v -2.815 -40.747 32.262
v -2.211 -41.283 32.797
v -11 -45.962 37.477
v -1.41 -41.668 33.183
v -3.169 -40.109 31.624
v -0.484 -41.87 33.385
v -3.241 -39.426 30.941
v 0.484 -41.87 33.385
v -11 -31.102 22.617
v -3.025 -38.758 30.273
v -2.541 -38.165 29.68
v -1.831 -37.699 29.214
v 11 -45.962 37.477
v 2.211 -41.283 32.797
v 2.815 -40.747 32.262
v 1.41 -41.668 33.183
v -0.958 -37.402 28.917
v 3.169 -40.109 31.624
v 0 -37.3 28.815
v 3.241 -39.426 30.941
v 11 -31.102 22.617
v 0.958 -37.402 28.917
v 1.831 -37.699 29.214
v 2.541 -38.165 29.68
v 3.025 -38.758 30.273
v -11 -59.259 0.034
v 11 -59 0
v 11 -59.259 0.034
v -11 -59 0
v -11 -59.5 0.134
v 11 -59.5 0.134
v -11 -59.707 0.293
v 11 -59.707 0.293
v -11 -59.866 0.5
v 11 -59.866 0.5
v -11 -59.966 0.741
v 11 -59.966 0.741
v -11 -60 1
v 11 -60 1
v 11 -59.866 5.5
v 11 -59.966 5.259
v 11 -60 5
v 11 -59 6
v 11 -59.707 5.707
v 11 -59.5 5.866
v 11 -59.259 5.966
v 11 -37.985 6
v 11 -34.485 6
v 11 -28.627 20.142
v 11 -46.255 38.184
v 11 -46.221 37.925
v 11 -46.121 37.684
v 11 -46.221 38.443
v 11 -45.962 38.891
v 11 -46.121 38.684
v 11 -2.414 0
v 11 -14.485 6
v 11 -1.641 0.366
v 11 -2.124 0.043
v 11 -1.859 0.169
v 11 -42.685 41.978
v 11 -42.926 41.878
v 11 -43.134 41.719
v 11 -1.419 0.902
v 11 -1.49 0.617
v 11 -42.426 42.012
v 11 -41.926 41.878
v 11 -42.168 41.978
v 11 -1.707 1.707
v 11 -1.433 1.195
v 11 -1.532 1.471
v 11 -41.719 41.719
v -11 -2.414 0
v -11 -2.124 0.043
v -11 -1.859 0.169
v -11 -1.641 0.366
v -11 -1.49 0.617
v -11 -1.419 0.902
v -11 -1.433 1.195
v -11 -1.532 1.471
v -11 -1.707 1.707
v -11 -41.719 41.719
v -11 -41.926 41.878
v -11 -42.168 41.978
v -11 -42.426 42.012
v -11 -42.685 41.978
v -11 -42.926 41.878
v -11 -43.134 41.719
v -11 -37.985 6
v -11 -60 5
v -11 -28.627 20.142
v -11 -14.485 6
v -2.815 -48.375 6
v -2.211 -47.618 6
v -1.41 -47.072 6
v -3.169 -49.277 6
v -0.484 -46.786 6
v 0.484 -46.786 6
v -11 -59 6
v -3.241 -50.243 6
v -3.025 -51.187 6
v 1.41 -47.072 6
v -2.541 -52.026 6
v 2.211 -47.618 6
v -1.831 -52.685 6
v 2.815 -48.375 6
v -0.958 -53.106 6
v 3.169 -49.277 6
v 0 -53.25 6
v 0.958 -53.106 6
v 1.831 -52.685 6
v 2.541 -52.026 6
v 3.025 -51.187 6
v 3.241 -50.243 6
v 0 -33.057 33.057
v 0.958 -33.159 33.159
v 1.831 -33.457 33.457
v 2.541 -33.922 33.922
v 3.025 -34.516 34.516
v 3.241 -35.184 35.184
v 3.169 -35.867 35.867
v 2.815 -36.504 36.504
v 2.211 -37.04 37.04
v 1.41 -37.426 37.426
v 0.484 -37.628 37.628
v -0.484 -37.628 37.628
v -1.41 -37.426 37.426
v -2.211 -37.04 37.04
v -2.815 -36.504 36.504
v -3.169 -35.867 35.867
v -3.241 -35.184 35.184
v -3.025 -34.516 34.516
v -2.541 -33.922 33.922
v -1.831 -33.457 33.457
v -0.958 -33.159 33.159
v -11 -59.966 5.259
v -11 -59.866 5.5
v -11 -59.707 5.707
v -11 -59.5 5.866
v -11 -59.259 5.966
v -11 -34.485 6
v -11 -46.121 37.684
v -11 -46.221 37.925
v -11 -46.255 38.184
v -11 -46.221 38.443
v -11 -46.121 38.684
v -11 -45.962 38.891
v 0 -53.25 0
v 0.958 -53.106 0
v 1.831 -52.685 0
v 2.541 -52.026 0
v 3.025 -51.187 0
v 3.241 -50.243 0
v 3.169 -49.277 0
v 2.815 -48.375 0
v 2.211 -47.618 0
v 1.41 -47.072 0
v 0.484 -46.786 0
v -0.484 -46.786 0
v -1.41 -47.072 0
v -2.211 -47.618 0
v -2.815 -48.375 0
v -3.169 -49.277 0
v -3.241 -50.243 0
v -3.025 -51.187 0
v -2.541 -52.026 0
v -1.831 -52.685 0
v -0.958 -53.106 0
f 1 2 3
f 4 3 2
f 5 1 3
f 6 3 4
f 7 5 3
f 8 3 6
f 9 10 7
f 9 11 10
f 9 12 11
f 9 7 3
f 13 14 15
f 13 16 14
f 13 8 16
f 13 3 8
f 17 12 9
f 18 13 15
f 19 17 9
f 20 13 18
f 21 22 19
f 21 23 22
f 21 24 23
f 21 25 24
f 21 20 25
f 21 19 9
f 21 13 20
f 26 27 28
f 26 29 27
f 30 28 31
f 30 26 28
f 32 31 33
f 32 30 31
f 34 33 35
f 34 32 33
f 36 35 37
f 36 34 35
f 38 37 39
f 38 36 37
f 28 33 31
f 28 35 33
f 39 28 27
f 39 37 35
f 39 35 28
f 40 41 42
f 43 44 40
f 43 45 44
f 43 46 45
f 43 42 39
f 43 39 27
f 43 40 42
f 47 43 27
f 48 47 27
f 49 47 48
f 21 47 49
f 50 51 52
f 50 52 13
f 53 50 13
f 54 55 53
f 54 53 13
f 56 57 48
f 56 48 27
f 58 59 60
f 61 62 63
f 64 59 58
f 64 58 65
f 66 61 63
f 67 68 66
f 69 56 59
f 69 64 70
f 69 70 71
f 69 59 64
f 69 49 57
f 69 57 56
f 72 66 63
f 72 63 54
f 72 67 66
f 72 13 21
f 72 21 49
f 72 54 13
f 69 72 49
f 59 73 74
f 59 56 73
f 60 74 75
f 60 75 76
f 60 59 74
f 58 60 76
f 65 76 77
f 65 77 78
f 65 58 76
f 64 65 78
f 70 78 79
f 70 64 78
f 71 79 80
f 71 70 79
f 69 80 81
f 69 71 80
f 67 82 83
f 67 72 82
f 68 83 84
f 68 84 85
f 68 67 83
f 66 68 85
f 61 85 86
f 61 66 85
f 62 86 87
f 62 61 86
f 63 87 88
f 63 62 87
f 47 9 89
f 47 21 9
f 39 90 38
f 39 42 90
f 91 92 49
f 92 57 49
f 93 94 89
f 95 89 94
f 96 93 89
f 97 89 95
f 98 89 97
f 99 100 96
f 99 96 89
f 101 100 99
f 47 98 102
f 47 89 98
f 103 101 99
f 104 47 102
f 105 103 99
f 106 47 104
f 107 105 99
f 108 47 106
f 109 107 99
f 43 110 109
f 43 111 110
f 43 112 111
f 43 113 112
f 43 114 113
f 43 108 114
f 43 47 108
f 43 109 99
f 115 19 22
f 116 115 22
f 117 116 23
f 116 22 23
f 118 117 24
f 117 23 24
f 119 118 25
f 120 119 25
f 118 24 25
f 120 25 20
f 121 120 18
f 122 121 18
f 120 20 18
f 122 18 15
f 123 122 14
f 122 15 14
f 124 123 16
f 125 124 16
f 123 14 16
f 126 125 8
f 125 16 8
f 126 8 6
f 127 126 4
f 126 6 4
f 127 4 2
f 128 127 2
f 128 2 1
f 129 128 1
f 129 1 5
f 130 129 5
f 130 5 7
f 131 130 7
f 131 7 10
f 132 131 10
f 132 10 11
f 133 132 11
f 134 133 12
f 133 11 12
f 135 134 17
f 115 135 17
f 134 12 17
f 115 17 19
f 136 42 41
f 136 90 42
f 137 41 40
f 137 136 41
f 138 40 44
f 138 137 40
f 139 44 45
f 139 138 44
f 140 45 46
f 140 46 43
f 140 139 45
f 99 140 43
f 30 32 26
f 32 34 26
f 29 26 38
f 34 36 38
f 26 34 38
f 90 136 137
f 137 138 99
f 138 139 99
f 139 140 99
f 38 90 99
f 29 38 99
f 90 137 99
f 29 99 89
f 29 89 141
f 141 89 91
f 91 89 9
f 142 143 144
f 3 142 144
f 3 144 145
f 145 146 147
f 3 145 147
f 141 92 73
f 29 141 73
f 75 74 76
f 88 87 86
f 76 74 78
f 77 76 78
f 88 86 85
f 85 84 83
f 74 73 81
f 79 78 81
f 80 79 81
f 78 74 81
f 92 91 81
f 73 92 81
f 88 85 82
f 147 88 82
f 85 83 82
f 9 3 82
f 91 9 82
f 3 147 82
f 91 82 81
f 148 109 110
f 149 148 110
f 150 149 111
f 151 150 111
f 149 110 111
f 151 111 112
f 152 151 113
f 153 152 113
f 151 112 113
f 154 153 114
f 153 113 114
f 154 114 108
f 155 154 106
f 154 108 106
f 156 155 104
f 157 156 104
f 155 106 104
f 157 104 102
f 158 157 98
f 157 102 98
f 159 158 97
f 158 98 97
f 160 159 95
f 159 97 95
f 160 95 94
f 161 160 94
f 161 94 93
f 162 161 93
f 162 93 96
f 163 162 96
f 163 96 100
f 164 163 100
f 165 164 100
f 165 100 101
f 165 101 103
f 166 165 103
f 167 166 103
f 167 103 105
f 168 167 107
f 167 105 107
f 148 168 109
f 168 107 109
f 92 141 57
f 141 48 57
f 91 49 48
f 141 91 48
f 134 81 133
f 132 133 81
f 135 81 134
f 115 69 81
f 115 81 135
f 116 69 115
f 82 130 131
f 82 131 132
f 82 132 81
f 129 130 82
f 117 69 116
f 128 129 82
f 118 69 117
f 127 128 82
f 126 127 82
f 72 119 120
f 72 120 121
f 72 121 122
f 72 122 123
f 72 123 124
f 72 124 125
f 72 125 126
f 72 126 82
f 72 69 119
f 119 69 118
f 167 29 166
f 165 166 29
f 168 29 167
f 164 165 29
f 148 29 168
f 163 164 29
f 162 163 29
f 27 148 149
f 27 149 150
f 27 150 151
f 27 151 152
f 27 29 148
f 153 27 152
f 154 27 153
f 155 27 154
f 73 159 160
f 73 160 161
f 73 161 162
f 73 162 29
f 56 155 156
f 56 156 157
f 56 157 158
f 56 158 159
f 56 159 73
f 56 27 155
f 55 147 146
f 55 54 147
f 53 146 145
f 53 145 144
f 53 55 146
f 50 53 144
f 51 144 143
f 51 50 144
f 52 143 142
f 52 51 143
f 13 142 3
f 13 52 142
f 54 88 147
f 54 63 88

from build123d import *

# Parameters (mm, degrees)
PAD_DEPTH       = 11
SKETCH001_R     = 3.25
POCKET_DEPTH    = 6
SKETCH002_R     = 3.25
POCKET001_DEPTH = 6
FILLET_R        = 1


with BuildPart() as part:
    # Sketch → Pad (new body, symmetric)
    with BuildSketch(Plane.YZ):
        Polygon((-60, 0), (0, 0), (-42.4264068712, 42.4264068712), (-46.6690475583, 38.1837661841), (-31.1022907321, 22.6170093579), (-37.9852813742, 6), (-60, 6), align=None)
        Polygon((-28.627416998, 20.1421356237), (-34.4852813742, 6), (-14.4852813742, 6), align=None, mode=Mode.SUBTRACT)
    extrude(amount=PAD_DEPTH, both=True)

    # Sketch001 (on Face6 of Pad) → Pocket (cut)
    with BuildSketch(Plane(origin=(0, 0, 6), x_dir=(0, -1, 0), z_dir=(0, 0, 1))):
        with Locations((50, 0)):
            Circle(SKETCH001_R)
    extrude(amount=-POCKET_DEPTH, mode=Mode.SUBTRACT)

    # Sketch002 (on Face9 of Pocket) → Pocket001 (cut)
    with BuildSketch(Plane(origin=(0, -4.2426406871, -4.2426406871), x_dir=(0, 0.7071067812, -0.7071067812), z_dir=(0, -0.7071067812, -0.7071067812))):
        with Locations((-50, 0)):
            Circle(SKETCH002_R)
    extrude(amount=-POCKET001_DEPTH, mode=Mode.SUBTRACT)

    # Fillet
    fillet_edges = [part.edges().sort_by_distance(p)[0] for p in [
        (0, 0, 0),
        (0, -60, 0),
        (0, -60, 6),
        (0, -46.669048, 38.183766),
        (0, -42.426407, 42.426407),
    ]]
    fillet(fillet_edges, radius=FILLET_R)


solid = part.part
